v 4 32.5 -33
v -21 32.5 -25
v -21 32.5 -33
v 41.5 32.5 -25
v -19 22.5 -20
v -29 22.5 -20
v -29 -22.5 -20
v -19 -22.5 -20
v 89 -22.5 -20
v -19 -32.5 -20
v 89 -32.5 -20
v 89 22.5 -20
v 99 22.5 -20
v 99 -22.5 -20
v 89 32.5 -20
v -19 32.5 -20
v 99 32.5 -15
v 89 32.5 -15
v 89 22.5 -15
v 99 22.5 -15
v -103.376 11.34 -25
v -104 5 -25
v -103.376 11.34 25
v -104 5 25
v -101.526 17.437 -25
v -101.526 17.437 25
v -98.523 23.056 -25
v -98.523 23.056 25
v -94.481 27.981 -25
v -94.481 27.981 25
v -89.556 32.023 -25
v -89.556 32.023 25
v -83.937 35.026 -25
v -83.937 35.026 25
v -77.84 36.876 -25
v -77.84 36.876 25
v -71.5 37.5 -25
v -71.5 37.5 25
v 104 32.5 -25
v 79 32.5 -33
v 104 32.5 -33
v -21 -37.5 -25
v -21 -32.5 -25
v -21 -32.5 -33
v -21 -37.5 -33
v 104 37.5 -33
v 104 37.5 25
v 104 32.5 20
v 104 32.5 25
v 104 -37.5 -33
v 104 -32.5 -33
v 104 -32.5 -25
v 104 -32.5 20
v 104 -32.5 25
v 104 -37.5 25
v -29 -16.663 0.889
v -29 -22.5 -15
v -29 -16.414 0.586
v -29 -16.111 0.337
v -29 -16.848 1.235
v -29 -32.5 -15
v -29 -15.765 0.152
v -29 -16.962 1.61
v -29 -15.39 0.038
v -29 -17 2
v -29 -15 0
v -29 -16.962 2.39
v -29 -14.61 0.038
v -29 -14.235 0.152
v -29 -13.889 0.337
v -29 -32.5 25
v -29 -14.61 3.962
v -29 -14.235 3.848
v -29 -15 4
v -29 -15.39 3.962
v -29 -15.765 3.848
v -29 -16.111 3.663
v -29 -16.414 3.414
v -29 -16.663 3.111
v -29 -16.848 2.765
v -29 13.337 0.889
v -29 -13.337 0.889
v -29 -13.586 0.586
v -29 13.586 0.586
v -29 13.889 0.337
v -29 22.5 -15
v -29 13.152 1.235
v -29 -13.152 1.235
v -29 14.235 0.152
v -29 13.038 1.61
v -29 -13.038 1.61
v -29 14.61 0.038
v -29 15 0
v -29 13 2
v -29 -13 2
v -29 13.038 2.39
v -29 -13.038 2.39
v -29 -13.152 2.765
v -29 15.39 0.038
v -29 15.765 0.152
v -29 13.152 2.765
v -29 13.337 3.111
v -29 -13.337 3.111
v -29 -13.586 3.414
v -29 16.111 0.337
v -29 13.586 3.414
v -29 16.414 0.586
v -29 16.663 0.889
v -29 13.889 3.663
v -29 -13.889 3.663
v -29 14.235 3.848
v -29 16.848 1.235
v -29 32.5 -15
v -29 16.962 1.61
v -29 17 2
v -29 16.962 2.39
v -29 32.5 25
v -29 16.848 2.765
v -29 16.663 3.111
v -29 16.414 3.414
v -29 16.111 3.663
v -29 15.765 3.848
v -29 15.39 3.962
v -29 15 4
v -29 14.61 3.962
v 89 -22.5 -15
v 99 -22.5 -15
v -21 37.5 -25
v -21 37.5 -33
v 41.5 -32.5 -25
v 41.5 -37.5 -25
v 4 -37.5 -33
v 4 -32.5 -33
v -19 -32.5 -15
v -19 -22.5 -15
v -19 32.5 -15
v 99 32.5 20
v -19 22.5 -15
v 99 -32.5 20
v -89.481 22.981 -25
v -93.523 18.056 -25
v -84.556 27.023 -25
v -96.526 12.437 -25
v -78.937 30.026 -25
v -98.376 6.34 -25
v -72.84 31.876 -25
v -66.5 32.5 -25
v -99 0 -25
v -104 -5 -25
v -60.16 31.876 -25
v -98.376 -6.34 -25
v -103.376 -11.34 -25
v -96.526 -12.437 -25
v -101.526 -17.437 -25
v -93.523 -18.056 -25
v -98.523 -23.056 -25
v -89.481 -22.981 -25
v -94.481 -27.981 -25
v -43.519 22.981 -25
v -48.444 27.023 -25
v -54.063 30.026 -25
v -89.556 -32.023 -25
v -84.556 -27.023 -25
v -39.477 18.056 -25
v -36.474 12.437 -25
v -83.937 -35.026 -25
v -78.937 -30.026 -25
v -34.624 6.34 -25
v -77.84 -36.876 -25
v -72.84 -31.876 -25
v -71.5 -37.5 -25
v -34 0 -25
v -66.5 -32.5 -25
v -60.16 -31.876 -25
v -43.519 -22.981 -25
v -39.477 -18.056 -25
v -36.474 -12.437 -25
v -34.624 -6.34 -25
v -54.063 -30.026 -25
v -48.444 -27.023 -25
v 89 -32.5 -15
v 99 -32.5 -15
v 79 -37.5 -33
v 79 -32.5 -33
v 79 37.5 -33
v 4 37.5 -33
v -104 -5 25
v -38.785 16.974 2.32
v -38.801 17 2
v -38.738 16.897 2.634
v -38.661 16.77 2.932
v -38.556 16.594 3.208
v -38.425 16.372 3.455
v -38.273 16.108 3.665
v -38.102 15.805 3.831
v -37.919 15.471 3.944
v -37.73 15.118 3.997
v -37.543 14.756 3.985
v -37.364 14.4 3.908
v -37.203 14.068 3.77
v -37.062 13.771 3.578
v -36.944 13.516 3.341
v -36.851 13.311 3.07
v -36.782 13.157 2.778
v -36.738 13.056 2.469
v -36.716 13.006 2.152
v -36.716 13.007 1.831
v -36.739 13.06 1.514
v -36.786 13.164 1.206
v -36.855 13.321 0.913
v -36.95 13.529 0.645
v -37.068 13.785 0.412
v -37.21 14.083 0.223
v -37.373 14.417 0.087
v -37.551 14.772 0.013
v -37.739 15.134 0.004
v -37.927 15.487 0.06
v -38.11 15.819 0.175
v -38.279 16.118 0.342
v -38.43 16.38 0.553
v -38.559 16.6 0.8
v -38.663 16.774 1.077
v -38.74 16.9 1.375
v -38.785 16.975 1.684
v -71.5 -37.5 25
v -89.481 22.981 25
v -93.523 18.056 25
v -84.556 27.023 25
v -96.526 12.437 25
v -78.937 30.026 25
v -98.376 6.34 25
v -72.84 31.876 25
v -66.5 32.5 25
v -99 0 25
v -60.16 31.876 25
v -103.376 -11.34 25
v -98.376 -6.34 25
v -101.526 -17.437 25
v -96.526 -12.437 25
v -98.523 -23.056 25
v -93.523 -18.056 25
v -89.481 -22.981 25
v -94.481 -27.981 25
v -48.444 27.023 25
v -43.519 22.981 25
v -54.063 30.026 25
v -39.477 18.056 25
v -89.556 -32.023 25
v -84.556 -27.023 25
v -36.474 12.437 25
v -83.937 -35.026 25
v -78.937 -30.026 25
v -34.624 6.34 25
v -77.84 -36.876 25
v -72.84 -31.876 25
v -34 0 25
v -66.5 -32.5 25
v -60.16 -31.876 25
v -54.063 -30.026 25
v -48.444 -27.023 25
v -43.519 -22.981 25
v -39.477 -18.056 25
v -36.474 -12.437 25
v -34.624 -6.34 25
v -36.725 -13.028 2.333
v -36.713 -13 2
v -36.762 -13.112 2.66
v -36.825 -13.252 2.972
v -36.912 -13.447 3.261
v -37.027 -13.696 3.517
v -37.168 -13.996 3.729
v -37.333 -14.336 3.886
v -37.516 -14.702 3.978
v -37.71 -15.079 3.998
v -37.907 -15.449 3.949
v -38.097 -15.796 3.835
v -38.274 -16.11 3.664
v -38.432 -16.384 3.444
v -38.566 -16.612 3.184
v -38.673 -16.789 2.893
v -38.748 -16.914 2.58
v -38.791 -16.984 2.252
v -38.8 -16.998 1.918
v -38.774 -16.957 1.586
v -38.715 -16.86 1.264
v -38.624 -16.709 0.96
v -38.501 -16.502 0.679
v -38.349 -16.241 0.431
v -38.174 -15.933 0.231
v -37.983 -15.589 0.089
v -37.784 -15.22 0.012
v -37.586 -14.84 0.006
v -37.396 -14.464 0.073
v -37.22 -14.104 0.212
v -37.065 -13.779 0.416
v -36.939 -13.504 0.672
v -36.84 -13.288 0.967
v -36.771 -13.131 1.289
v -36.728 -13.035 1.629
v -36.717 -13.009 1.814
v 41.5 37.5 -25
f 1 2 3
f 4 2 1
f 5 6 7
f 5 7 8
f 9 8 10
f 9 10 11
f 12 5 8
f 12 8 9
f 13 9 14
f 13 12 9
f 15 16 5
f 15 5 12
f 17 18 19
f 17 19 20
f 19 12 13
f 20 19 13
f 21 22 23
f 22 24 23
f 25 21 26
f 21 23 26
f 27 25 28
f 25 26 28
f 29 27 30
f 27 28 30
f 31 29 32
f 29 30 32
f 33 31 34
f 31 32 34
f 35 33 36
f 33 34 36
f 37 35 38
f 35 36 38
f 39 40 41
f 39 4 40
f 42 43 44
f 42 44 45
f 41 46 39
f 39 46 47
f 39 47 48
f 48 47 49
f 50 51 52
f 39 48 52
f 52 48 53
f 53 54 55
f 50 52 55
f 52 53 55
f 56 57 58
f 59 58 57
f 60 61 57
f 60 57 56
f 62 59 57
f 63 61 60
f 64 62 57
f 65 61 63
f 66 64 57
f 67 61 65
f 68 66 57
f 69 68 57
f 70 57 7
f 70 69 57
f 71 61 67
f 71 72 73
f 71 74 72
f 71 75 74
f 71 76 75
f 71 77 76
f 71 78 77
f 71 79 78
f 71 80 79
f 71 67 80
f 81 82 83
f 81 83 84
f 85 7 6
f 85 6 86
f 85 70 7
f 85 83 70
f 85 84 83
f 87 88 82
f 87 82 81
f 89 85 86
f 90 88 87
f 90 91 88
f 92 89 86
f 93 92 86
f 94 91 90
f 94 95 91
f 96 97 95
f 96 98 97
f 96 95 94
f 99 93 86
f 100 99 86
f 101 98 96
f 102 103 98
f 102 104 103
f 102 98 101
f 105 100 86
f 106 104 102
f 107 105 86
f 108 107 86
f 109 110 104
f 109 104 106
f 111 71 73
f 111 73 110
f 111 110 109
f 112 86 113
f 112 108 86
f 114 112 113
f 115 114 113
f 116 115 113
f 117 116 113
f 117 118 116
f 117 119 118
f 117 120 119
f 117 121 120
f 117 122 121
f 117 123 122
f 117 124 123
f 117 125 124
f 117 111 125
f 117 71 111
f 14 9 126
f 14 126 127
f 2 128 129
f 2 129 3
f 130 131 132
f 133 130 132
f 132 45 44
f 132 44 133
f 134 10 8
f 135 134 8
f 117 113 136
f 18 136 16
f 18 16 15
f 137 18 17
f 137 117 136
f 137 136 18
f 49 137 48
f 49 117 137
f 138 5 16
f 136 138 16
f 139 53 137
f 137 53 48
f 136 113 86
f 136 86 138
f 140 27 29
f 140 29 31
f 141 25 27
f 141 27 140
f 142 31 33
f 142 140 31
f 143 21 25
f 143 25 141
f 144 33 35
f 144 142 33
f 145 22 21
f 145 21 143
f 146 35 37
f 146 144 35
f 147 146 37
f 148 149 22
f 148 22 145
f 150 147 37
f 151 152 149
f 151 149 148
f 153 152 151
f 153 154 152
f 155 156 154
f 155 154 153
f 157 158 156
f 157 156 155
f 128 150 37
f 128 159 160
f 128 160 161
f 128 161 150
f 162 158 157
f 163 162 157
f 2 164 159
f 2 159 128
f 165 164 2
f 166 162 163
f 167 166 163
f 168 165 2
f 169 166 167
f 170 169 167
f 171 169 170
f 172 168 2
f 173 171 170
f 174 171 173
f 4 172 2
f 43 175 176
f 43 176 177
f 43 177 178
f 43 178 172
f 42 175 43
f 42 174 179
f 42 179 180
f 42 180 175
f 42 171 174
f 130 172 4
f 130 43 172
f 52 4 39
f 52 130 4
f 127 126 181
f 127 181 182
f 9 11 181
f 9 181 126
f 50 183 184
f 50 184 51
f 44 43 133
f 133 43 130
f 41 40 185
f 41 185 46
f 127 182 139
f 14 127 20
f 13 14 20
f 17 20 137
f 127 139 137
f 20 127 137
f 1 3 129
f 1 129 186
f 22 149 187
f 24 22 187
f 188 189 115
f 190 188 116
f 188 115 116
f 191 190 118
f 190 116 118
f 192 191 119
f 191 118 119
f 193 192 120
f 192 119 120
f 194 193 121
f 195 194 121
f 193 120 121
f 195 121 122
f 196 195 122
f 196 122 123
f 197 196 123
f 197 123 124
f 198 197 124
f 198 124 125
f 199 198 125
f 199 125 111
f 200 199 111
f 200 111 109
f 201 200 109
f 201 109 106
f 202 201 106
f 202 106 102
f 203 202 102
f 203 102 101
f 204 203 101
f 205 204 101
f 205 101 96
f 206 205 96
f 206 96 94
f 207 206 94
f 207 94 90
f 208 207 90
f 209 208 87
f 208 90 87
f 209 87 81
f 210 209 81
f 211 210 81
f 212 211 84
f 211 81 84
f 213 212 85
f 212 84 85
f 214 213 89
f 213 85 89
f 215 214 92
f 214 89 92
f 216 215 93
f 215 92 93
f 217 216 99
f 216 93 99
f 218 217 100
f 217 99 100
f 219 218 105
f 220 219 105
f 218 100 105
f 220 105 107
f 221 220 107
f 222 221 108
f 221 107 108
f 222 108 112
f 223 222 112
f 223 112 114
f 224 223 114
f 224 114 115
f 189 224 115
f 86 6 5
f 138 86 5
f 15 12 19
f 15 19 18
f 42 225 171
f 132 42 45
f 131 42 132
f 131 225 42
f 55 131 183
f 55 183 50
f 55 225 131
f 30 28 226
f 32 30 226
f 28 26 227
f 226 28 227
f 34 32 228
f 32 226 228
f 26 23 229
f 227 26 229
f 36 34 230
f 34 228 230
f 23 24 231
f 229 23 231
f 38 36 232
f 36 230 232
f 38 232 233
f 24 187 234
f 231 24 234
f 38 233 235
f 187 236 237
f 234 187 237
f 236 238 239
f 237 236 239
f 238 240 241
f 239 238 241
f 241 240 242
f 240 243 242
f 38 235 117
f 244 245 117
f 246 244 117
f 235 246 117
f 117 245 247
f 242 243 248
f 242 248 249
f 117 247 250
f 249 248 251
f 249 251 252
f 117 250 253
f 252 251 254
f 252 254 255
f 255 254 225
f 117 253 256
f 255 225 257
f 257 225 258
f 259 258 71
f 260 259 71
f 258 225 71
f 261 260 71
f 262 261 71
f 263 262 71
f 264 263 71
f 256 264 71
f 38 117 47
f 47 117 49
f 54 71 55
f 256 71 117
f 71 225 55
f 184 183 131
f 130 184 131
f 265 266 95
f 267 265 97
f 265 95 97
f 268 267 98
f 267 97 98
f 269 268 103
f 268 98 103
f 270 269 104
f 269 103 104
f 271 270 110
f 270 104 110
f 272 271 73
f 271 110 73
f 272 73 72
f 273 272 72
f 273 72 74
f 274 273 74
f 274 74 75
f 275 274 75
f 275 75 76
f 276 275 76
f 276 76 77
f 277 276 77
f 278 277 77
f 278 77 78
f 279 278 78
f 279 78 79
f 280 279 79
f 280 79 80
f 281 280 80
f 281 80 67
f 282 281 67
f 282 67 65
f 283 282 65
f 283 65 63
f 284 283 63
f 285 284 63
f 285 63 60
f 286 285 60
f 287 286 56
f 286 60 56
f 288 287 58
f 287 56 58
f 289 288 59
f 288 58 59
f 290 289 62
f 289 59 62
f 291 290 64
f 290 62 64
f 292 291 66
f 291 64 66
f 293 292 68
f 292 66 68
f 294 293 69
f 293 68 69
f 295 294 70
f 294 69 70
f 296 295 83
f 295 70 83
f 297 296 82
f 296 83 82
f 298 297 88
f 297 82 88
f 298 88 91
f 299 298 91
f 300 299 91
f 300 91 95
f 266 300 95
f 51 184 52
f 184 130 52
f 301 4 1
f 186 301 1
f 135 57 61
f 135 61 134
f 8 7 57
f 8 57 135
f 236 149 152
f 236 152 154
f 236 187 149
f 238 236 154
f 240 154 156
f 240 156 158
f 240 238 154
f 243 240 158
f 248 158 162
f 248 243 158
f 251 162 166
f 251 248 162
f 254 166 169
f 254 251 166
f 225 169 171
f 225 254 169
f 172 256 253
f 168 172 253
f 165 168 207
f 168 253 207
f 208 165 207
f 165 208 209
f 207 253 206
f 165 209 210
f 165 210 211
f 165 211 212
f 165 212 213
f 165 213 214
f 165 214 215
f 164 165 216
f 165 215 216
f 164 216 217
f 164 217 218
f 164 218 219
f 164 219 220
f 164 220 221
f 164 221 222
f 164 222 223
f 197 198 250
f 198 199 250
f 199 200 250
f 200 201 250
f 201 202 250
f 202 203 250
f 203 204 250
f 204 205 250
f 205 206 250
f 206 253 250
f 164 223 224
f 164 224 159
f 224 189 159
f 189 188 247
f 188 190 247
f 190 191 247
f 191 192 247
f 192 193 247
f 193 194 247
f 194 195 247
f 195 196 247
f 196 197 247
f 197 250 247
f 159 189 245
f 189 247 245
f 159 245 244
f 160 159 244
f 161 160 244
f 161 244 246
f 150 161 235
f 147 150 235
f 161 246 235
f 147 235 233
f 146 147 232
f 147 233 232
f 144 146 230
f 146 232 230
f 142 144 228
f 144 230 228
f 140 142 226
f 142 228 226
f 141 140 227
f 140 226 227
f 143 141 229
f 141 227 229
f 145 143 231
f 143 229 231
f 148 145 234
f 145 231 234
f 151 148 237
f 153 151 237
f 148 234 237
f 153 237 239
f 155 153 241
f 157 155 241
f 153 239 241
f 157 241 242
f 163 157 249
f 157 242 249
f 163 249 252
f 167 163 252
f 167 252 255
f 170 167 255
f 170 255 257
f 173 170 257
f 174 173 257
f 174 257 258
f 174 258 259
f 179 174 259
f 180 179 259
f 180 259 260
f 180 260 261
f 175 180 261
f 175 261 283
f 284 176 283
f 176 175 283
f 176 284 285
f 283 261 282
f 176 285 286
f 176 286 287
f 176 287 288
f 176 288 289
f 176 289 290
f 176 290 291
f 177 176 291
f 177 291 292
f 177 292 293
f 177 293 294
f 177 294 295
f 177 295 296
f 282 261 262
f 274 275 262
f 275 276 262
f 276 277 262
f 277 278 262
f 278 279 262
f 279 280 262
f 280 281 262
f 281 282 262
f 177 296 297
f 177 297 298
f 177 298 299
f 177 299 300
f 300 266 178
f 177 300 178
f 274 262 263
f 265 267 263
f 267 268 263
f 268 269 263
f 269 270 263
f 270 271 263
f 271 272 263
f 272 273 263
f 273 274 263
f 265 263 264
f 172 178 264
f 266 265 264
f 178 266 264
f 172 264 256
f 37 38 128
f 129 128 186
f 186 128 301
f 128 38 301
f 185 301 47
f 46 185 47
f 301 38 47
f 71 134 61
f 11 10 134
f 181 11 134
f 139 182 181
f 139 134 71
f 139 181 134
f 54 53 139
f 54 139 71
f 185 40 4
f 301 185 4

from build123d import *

# Parameters (mm, degrees)
F0_W      = 208
F0_H      = 50
F1_DEPTH  = 37.5
F2_R      = 32.5
F3_DEPTH  = 50.001
F4_W      = 128
F4_H      = 65
F5_DEPTH  = 45
F6_W      = 65
F6_H      = 5
F7_DEPTH  = 5
F8_W      = 10
F8_H      = 10
F9_DEPTH  = 5
F10_R     = 2
F11_DEPTH = 9.8017221311
F12_R     = 32.5
F13_W     = 125
F13_H     = 5
F14_DEPTH = 8
F16_DEPTH = 75.001


with BuildPart() as f1:
    # F0 (on Front) → F1 (new body, symmetric)
    with BuildSketch(Plane.XZ):
        Rectangle(F0_W, F0_H)
    extrude(amount=F1_DEPTH, both=True)

    # F2 (on face) → F3 (cut, through all)
    with BuildSketch(Plane.XY.offset(25)):
        with Locations((-66.5, 0)):
            Circle(F2_R)
    extrude(amount=-F3_DEPTH, mode=Mode.SUBTRACT)

    # F4 (on face) → F5 (cut)
    with BuildSketch(Plane.XY.offset(25)):
        with Locations((35, 0)):
            Rectangle(F4_W, F4_H)
    extrude(amount=-F5_DEPTH, mode=Mode.SUBTRACT)

    # F6 (on face) → F7 (cut, through all)
    with BuildSketch(Plane.YZ.offset(104)):
        with Locations((0, 22.5)):
            Rectangle(F6_W, F6_H)
    extrude(amount=-F7_DEPTH, mode=Mode.SUBTRACT)

    # F8 (on face) → F9 (join)
    with BuildSketch(Plane.XY.offset(-20)):
        with Locations((-24, 27.5)):
            Rectangle(F8_W, F8_H)
        with Locations((94, 27.5)):
            Rectangle(F8_W, F8_H)
        with Locations((-24, -27.5)):
            Rectangle(F8_W, F8_H)
        with Locations((94, -27.5)):
            Rectangle(F8_W, F8_H)
    extrude(amount=F9_DEPTH)

    # F10 (on face) → F11 (cut, through all)
    with BuildSketch(Plane.YZ.offset(-29)):
        with Locations((-15, 2)):
            Circle(F10_R)
        with Locations((15, 2)):
            Circle(F10_R)
    extrude(amount=-F11_DEPTH, mode=Mode.SUBTRACT)

    # F12
    f12_edges = [f1.edges().sort_by_distance(p)[0] for p in [
        (-104, -37.5, 0),
        (-104, 37.5, 0),
    ]]
    fillet(f12_edges, radius=F12_R)

    # F13 (on face) → F14 (join)
    with BuildSketch(Plane(origin=(0, 0, -25), x_dir=(1, 0, 0), z_dir=(0, 0, -1))):
        with Locations((41.5, 35)):
            Rectangle(F13_W, F13_H)
        with Locations((41.5, -35)):
            Rectangle(F13_W, F13_H)
    extrude(amount=F14_DEPTH)

    # F15 (on face) → F16 (cut, through all)
    with BuildSketch(Plane.XZ.offset(37.5)):
        Polygon((41.5, -25), (4, -33), (79, -33), align=None)
    extrude(amount=-F16_DEPTH, mode=Mode.SUBTRACT)


solid = f1.part
